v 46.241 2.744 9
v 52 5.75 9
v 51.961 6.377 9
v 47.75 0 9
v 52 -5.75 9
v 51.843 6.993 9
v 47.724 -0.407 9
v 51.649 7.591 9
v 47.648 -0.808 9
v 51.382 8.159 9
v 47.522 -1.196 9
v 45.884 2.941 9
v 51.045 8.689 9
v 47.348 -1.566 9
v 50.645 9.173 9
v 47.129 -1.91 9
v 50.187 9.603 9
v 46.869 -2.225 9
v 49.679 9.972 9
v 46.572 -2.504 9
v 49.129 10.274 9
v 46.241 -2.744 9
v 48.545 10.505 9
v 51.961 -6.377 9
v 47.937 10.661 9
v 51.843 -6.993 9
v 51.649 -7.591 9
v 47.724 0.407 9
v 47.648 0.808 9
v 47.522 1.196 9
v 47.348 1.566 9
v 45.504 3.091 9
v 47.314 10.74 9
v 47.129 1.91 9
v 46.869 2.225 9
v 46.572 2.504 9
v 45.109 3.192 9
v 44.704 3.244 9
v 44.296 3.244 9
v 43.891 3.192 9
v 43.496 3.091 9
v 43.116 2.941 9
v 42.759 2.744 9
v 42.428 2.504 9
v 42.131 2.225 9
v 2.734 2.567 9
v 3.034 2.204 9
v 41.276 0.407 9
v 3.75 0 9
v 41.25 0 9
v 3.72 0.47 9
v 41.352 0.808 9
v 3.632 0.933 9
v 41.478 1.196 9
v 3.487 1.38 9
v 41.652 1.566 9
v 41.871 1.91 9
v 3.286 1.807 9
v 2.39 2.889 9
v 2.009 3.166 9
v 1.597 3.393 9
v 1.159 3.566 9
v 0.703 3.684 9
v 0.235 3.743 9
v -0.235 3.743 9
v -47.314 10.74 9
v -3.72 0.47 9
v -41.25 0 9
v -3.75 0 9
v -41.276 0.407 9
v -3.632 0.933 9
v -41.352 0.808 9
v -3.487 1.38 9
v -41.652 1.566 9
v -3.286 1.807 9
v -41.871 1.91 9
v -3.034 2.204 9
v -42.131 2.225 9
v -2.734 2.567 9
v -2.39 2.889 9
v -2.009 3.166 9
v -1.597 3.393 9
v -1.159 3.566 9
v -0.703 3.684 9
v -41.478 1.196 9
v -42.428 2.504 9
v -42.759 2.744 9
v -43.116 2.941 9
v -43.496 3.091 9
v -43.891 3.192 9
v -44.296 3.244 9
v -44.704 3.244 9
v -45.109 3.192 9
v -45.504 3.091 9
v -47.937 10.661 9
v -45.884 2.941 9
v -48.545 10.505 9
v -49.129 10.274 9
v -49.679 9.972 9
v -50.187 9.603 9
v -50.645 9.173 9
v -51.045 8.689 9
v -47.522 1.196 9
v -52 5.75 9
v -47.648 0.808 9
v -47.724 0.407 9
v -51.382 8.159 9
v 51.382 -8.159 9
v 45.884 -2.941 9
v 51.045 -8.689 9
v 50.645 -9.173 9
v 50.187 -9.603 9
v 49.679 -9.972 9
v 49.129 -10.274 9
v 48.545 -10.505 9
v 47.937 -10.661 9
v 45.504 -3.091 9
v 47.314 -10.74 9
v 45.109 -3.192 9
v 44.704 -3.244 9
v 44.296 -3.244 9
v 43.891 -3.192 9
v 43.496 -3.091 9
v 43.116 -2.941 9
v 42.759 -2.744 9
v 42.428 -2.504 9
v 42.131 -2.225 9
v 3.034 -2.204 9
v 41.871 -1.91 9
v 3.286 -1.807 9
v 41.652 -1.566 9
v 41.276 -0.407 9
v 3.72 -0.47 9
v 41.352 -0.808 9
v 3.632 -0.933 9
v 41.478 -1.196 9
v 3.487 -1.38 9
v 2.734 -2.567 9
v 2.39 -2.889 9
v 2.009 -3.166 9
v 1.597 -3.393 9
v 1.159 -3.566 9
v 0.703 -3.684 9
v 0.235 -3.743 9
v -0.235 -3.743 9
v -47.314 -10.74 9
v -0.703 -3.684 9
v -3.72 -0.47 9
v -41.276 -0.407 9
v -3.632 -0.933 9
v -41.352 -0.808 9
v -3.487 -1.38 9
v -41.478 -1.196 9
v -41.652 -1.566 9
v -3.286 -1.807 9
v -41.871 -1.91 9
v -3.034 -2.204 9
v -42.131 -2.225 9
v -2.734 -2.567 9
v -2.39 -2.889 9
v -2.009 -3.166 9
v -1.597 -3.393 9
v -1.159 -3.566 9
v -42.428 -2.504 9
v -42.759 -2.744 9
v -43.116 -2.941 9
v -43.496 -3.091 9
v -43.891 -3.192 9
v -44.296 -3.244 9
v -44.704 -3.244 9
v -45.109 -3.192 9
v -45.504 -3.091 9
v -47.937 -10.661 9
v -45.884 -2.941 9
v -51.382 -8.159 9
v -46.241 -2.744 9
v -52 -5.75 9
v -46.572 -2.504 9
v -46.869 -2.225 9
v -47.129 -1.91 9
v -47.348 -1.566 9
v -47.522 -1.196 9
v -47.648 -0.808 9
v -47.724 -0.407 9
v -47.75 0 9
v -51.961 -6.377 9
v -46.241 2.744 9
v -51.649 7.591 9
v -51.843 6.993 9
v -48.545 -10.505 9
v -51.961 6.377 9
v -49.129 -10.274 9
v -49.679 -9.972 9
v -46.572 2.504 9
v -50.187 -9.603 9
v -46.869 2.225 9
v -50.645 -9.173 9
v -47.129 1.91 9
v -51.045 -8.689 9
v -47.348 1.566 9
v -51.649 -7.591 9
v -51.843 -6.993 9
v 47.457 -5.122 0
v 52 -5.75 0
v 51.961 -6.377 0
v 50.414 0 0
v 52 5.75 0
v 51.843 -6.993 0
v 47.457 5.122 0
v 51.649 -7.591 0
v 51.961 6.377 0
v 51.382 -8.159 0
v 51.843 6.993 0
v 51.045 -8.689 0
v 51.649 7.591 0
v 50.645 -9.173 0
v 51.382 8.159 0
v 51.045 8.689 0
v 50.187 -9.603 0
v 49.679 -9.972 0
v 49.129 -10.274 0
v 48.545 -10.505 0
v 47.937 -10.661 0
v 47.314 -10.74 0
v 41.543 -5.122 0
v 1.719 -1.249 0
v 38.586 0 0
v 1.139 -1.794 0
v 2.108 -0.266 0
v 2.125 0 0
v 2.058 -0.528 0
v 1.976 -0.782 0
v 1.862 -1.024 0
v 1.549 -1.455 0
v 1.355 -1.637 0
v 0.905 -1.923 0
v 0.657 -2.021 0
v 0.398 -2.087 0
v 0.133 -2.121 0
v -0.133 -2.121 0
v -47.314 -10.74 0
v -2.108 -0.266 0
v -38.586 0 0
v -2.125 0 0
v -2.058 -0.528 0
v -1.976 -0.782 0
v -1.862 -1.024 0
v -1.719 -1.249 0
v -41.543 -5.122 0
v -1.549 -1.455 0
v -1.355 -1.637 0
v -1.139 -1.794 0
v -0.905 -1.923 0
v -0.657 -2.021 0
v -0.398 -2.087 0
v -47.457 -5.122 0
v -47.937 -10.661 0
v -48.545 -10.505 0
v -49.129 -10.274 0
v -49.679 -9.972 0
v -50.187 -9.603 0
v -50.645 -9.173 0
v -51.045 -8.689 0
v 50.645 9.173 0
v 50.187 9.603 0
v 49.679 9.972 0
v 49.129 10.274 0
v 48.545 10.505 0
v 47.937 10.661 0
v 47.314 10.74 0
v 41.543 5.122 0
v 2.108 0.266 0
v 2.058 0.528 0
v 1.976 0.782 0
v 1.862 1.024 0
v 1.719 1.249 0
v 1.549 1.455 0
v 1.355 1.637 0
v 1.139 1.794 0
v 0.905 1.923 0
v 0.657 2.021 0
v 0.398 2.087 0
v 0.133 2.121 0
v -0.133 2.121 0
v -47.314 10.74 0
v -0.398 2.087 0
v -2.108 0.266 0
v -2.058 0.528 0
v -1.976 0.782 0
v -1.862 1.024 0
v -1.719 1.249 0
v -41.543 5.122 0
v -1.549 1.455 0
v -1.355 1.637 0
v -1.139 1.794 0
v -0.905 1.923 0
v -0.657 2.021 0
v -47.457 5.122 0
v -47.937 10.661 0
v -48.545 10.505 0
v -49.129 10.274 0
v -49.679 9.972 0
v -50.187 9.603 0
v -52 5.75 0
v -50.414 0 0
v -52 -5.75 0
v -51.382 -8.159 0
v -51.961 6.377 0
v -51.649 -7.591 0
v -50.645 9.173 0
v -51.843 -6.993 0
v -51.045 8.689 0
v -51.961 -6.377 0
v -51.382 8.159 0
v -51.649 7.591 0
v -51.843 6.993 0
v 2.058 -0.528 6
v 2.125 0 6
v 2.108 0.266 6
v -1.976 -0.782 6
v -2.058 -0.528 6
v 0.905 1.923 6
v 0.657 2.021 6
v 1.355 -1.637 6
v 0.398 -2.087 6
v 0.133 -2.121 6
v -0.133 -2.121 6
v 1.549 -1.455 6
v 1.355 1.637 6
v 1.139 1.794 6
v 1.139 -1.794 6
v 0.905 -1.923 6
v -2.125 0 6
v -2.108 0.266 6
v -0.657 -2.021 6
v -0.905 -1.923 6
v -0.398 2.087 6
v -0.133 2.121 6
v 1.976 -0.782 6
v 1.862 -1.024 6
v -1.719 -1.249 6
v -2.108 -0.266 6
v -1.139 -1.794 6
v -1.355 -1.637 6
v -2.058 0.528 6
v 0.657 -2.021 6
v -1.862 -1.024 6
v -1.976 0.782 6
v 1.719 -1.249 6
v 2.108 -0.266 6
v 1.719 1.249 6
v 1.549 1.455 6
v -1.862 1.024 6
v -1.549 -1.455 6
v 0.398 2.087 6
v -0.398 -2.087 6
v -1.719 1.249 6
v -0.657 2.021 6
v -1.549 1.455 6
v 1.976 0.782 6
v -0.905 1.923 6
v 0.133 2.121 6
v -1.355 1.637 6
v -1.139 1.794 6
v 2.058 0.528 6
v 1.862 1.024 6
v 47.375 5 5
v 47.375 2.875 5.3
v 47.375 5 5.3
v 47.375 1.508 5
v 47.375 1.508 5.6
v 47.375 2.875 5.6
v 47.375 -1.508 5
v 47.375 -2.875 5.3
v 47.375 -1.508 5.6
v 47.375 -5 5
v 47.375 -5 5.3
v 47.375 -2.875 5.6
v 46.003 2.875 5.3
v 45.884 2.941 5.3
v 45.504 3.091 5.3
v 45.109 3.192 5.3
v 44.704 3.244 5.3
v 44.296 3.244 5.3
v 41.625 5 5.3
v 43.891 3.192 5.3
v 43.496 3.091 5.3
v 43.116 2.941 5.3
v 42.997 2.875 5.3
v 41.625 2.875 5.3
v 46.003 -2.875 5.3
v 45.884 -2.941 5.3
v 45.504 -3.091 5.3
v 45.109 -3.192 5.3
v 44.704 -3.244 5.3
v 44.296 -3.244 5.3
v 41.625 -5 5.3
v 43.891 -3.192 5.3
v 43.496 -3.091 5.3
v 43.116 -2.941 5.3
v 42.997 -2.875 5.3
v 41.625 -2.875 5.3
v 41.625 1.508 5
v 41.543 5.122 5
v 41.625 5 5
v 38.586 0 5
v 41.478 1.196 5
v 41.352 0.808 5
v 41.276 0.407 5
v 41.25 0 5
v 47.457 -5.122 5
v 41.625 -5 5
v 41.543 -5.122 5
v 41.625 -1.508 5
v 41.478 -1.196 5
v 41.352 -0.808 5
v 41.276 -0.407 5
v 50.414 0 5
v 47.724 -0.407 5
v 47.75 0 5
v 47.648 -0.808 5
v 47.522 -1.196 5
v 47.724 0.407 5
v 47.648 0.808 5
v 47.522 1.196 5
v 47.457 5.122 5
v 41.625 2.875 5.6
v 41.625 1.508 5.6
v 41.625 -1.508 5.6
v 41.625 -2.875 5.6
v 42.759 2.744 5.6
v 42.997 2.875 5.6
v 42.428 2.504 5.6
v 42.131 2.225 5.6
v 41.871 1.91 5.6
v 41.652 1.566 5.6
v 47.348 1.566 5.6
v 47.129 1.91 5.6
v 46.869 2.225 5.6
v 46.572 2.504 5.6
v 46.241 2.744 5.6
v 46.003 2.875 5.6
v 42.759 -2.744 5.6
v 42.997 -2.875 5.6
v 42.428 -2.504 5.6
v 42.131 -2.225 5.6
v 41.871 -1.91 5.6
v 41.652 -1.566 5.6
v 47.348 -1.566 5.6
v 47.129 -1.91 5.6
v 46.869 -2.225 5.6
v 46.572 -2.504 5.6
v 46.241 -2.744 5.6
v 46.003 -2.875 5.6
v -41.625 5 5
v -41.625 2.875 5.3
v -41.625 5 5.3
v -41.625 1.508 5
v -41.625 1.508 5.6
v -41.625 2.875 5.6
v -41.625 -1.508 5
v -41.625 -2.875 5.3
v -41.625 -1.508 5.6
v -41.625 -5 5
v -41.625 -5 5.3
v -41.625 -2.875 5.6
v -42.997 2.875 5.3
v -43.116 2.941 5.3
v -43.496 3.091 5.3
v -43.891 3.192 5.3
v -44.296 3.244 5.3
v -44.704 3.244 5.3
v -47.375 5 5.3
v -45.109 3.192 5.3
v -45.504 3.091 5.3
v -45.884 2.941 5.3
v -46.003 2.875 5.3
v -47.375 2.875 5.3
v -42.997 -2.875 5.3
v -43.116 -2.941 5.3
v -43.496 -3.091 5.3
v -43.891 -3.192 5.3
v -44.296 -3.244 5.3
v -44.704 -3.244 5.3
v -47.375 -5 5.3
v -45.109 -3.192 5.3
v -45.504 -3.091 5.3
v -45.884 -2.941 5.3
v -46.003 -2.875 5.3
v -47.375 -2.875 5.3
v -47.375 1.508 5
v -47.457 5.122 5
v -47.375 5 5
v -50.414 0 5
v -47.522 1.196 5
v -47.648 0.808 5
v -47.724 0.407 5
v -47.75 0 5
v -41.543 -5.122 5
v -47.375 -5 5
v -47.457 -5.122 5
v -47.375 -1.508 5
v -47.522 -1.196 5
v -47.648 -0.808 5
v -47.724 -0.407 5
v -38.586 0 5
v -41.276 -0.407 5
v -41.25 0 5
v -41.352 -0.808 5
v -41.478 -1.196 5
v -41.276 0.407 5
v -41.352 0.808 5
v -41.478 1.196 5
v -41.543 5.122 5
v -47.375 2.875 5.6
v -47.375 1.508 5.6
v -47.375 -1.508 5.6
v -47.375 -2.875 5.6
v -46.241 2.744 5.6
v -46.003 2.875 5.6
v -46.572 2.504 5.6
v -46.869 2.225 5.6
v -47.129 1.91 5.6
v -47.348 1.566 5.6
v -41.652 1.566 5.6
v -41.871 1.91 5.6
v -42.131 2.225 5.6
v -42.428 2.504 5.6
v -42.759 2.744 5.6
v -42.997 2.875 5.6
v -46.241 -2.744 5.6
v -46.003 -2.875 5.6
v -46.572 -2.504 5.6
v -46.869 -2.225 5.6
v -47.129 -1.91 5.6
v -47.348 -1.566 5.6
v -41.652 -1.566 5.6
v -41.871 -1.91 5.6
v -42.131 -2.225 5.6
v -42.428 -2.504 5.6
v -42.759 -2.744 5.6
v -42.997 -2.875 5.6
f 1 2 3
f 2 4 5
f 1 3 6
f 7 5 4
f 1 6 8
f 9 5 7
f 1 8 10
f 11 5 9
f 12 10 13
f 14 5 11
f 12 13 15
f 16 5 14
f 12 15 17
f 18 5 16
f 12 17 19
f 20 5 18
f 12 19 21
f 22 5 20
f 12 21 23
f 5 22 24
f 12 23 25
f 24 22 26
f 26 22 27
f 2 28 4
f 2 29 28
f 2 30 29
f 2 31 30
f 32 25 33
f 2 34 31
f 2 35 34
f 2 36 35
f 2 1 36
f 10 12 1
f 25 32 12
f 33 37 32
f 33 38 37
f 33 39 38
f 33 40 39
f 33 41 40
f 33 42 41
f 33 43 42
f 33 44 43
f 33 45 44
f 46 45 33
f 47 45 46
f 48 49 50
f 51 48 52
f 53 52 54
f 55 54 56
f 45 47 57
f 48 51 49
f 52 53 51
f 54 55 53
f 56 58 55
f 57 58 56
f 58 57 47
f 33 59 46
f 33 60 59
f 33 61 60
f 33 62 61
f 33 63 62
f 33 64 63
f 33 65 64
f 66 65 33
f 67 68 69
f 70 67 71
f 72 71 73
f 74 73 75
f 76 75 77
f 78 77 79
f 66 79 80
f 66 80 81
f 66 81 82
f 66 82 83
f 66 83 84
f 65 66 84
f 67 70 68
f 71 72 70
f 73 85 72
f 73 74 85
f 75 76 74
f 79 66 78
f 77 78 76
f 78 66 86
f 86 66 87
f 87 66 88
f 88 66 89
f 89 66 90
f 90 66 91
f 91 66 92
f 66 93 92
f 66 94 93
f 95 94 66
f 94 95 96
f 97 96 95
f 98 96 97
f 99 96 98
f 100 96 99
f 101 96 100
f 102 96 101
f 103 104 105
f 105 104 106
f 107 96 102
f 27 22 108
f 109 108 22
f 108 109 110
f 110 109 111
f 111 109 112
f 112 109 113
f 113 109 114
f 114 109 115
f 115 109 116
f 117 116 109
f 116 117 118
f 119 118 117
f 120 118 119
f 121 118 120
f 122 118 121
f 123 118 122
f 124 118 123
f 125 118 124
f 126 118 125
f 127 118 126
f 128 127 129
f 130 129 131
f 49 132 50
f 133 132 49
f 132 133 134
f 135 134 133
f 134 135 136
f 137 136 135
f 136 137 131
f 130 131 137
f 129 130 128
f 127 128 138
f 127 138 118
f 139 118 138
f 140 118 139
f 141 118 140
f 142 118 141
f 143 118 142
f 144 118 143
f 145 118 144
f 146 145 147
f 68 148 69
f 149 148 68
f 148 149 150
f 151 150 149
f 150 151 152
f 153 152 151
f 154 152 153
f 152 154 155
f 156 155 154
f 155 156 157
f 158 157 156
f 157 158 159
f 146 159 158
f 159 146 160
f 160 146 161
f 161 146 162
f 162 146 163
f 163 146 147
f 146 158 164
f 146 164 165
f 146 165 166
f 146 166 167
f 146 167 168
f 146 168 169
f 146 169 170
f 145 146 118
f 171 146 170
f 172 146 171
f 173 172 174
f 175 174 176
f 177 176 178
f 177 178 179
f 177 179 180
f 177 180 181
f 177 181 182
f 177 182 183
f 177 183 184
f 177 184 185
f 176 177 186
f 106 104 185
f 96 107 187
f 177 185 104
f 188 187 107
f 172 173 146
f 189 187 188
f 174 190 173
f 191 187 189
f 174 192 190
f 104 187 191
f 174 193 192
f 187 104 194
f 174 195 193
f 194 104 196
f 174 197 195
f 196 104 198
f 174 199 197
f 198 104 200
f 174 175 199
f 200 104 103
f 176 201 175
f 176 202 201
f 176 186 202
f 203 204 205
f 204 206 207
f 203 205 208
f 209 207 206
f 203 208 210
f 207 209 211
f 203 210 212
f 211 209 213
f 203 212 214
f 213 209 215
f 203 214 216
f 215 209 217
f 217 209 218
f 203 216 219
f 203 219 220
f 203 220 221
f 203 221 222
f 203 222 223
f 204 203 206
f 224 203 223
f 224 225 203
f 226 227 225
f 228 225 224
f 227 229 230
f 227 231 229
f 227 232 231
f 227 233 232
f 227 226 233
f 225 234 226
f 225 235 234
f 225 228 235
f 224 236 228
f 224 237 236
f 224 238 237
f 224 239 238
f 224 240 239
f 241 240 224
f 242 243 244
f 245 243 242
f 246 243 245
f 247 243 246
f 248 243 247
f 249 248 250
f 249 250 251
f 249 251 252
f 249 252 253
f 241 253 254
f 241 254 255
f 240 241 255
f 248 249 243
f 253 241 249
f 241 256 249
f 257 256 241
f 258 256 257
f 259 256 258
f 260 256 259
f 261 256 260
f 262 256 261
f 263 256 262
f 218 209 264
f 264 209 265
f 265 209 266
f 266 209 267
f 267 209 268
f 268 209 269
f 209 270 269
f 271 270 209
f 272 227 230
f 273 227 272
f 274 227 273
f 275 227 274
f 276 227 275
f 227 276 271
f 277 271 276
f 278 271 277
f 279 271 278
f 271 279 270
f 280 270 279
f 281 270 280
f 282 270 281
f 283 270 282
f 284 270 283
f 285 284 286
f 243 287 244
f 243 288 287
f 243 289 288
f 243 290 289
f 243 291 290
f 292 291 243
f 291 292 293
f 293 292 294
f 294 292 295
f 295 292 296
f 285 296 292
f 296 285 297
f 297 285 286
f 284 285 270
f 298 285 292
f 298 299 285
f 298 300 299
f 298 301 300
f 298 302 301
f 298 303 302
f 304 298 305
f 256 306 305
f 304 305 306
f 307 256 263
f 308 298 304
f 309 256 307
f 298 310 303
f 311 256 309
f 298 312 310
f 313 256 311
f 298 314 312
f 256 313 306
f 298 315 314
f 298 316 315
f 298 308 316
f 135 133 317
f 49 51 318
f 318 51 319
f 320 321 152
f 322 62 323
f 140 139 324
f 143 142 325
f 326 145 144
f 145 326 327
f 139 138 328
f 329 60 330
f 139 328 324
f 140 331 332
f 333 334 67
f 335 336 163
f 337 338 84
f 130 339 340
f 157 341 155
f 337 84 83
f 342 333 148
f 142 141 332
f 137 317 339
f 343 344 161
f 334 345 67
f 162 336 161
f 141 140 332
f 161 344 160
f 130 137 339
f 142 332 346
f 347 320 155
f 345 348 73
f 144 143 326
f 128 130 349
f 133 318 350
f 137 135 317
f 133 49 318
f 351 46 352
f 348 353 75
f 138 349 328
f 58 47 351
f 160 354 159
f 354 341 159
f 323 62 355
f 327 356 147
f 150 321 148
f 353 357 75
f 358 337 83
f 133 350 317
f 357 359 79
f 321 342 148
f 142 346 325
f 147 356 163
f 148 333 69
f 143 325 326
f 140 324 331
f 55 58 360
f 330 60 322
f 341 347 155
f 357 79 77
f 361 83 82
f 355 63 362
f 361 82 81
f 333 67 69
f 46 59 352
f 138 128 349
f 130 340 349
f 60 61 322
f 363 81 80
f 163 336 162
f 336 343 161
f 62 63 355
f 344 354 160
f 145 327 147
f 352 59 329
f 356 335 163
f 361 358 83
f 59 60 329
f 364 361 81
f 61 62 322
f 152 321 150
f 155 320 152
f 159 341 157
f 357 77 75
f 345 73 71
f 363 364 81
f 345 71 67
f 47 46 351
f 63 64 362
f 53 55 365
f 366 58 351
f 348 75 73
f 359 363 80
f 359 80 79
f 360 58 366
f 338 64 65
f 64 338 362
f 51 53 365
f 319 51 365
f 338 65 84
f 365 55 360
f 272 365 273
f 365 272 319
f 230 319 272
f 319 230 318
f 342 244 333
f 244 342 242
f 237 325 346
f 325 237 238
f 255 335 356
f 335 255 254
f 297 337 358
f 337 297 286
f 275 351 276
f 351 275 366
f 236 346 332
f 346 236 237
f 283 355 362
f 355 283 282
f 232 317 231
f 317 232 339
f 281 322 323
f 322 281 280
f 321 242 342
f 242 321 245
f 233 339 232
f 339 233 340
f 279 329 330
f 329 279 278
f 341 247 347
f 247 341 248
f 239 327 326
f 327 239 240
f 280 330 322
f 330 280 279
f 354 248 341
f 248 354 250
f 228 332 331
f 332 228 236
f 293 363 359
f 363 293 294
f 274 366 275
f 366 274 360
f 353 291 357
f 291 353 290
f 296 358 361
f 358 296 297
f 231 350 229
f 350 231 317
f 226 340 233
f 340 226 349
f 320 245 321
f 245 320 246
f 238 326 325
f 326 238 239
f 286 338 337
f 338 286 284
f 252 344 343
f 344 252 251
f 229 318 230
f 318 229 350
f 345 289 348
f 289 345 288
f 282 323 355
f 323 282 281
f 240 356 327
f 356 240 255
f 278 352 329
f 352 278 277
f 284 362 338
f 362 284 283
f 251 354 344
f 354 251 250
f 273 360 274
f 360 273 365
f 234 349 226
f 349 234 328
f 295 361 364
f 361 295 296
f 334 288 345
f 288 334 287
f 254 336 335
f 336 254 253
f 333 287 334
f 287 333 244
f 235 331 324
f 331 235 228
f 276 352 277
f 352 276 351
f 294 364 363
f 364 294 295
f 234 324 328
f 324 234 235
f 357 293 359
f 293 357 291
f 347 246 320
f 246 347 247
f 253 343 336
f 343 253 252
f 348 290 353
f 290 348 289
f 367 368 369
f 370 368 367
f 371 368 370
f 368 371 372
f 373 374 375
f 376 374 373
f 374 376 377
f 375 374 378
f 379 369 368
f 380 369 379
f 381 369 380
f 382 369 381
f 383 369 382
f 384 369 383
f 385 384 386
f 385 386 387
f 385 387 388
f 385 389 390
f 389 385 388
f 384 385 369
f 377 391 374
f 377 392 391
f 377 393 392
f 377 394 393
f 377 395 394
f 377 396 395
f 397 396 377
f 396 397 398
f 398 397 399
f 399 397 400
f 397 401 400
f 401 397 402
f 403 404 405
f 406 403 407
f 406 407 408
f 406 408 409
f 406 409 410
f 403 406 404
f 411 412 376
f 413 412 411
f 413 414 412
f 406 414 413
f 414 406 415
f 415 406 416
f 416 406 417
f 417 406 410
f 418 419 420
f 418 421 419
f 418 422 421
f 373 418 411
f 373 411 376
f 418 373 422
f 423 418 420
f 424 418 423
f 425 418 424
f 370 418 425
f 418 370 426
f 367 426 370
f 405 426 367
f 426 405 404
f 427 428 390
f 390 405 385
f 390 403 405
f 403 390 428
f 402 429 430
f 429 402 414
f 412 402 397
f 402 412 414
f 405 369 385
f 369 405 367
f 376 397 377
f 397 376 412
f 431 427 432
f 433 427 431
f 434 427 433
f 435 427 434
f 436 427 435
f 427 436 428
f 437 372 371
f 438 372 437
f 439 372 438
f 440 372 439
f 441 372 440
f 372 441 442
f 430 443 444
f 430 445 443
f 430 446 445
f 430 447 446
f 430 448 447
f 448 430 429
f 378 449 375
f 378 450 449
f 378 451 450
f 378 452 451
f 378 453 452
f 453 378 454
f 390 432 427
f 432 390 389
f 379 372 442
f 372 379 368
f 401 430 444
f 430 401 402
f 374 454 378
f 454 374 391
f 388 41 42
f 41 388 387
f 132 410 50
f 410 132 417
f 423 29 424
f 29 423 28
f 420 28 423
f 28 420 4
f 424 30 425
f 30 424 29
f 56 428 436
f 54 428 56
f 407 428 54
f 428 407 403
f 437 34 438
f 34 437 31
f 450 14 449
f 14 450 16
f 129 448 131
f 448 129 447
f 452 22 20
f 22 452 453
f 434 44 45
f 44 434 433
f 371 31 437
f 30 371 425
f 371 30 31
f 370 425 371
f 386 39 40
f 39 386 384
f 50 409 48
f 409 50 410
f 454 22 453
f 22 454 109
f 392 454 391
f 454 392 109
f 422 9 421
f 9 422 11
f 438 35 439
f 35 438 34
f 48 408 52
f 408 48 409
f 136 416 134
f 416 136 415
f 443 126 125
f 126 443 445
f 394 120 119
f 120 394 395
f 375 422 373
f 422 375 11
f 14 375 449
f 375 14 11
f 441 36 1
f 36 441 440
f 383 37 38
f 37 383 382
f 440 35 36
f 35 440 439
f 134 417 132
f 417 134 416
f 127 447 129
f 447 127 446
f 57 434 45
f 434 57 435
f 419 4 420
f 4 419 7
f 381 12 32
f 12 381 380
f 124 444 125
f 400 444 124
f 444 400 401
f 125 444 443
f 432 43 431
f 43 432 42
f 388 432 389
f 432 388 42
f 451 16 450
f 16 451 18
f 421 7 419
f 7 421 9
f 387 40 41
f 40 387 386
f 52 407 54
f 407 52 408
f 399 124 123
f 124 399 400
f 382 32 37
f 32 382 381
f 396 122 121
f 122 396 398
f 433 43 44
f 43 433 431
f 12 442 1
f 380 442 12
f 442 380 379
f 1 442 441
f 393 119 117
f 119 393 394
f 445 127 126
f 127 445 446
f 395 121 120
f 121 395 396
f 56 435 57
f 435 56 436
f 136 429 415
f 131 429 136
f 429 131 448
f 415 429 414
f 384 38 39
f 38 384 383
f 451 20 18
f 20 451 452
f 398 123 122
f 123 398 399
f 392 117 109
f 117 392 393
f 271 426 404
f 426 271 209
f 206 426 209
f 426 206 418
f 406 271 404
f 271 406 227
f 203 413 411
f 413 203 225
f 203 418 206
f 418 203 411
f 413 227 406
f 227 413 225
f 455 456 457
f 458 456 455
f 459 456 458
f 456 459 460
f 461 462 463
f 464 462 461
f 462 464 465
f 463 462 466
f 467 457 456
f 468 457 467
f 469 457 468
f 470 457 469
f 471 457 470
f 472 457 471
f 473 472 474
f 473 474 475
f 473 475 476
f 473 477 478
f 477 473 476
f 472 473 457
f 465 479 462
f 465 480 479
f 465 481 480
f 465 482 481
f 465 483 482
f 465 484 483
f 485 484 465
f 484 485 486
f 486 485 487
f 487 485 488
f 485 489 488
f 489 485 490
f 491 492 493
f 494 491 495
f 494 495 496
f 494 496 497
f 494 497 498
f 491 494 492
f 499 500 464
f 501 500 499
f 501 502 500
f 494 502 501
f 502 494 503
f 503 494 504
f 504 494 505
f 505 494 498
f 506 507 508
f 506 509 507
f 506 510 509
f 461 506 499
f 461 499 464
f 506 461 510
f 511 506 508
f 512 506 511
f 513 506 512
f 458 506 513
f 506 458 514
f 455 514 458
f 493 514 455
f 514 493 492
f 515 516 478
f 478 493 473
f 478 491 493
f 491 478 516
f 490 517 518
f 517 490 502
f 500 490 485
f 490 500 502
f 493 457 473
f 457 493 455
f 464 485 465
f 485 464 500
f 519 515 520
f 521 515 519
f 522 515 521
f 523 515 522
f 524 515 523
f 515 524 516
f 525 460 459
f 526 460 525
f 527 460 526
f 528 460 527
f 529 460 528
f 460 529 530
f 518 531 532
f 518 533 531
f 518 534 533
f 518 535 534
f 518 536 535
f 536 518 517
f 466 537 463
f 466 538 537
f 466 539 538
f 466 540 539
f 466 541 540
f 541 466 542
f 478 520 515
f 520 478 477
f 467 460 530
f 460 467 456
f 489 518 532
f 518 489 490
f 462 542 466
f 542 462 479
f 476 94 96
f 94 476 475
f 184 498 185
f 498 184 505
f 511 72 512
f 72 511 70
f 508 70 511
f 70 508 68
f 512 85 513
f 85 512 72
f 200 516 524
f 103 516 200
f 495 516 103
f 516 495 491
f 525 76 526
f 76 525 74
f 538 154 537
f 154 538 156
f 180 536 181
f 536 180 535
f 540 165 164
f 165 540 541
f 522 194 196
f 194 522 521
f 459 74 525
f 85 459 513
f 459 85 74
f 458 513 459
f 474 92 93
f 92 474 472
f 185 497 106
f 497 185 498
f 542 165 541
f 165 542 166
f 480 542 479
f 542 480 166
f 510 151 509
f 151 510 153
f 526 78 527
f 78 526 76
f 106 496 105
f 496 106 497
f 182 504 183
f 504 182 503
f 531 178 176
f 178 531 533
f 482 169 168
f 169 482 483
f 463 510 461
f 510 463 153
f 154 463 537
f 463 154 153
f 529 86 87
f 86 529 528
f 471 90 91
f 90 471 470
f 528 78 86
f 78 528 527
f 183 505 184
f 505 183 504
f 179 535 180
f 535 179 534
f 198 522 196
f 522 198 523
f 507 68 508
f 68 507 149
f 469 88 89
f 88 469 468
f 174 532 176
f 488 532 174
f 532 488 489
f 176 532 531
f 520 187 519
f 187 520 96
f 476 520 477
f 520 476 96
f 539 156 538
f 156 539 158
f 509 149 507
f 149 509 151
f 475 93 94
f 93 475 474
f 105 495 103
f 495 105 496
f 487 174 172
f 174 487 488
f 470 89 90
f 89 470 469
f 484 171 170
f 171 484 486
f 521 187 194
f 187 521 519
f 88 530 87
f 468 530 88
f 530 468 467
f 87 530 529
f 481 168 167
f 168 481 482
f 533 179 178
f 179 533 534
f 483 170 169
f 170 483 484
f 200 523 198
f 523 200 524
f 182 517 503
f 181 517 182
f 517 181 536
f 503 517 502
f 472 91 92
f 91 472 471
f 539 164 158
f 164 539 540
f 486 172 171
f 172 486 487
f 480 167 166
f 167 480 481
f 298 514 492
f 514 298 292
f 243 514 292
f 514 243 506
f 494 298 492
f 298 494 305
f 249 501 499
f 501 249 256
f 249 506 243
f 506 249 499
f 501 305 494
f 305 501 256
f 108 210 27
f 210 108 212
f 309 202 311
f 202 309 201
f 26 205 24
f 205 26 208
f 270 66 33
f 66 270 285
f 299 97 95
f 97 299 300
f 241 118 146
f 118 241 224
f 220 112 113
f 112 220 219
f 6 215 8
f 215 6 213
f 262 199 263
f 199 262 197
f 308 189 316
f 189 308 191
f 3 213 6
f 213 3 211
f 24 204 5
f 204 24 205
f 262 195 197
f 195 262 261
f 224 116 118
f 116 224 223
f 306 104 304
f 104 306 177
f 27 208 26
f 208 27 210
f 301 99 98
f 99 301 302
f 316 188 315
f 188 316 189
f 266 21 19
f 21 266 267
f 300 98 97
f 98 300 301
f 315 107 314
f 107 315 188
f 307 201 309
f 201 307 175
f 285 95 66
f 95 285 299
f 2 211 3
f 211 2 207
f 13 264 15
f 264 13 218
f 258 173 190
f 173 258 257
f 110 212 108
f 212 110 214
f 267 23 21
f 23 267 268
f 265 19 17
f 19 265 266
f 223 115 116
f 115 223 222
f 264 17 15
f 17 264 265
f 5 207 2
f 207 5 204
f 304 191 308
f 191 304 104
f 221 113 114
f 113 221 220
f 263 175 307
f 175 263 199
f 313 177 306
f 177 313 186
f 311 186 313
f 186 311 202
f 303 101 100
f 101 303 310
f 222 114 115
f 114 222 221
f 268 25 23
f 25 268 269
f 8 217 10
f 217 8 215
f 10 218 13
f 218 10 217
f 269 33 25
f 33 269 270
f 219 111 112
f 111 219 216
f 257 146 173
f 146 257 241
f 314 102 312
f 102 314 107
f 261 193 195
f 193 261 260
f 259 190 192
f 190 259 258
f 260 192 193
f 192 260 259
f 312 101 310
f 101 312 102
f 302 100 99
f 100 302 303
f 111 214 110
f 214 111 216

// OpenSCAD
$fn = 50;


difference() {
	union() {
		hull() {
			translate(v = [-47.0000000000, 5.7500000000, 0]) {
				cylinder(h = 9, r = 5);
			}
			translate(v = [47.0000000000, 5.7500000000, 0]) {
				cylinder(h = 9, r = 5);
			}
			translate(v = [-47.0000000000, -5.7500000000, 0]) {
				cylinder(h = 9, r = 5);
			}
			translate(v = [47.0000000000, -5.7500000000, 0]) {
				cylinder(h = 9, r = 5);
			}
		}
	}
	union() {
		translate(v = [0, 0, 9]) {
			rotate(a = [0, 0, 0]) {
				difference() {
					union() {
						#translate(v = [0, 0, -9.0000000000]) {
							cylinder(h = 9, r = 2.0000000000);
						}
						#translate(v = [0, 0, -3]) {
							cylinder(h = 3, r1 = 2.1250000000, r2 = 3.7500000000);
						}
						#translate(v = [0, 0, -9.0000000000]) {
							cylinder(h = 9, r = 2.1250000000);
						}
						#translate(v = [0, 0, -9.0000000000]) {
							cylinder(h = 9, r = 2.0000000000);
						}
					}
					union();
				}
			}
		}
		translate(v = [44.5000000000, 0, 0]) {
			rotate(a = [0, 0, 0]) {
				difference() {
					union() {
						#translate(v = [-2.8750000000, -5.0000000000, -0.3000000000]) {
							cube(size = [5.7500000000, 10, 0.3000000000]);
						}
						#translate(v = [-2.8750000000, -2.8750000000, -0.6000000000]) {
							cube(size = [5.7500000000, 5.7500000000, 0.3000000000]);
						}
						#translate(v = [-2.8750000000, -5.0000000000, 5]) {
							cube(size = [5.7500000000, 10, 0.3000000000]);
						}
						#translate(v = [-2.8750000000, -2.8750000000, 5.3000000000]) {
							cube(size = [5.7500000000, 5.7500000000, 0.3000000000]);
						}
						#translate(v = [0, 0, -100.0000000000]) {
							cylinder(h = 200, r = 3.2500000000);
						}
						#linear_extrude(height = 5) {
							polygon(points = [[5.9142500000, 0.0000000000], [2.9571250000, 5.1218907443], [-2.9571250000, 5.1218907443], [-5.9142500000, 0.0000000000], [-2.9571250000, -5.1218907443], [2.9571250000, -5.1218907443]]);
						}
						#translate(v = [-2.8750000000, -5.0000000000, -0.3000000000]) {
							cube(size = [5.7500000000, 10, 0.3000000000]);
						}
						#translate(v = [-2.8750000000, -2.8750000000, -0.6000000000]) {
							cube(size = [5.7500000000, 5.7500000000, 0.3000000000]);
						}
						#translate(v = [-2.8750000000, -5.0000000000, 5]) {
							cube(size = [5.7500000000, 10, 0.3000000000]);
						}
						#translate(v = [-2.8750000000, -2.8750000000, 5.3000000000]) {
							cube(size = [5.7500000000, 5.7500000000, 0.3000000000]);
						}
						#translate(v = [0, 0, -100.0000000000]) {
							cylinder(h = 200, r = 3.2500000000);
						}
						#translate(v = [-2.8750000000, -5.0000000000, -0.3000000000]) {
							cube(size = [5.7500000000, 10, 0.3000000000]);
						}
						#translate(v = [-2.8750000000, -2.8750000000, -0.6000000000]) {
							cube(size = [5.7500000000, 5.7500000000, 0.3000000000]);
						}
						#translate(v = [-2.8750000000, -5.0000000000, 5]) {
							cube(size = [5.7500000000, 10, 0.3000000000]);
						}
						#translate(v = [-2.8750000000, -2.8750000000, 5.3000000000]) {
							cube(size = [5.7500000000, 5.7500000000, 0.3000000000]);
						}
						#translate(v = [0, 0, -100.0000000000]) {
							cylinder(h = 200, r = 3.2500000000);
						}
					}
					union();
				}
			}
		}
		translate(v = [-44.5000000000, 0, 0]) {
			rotate(a = [0, 0, 0]) {
				difference() {
					union() {
						#translate(v = [-2.8750000000, -5.0000000000, -0.3000000000]) {
							cube(size = [5.7500000000, 10, 0.3000000000]);
						}
						#translate(v = [-2.8750000000, -2.8750000000, -0.6000000000]) {
							cube(size = [5.7500000000, 5.7500000000, 0.3000000000]);
						}
						#translate(v = [-2.8750000000, -5.0000000000, 5]) {
							cube(size = [5.7500000000, 10, 0.3000000000]);
						}
						#translate(v = [-2.8750000000, -2.8750000000, 5.3000000000]) {
							cube(size = [5.7500000000, 5.7500000000, 0.3000000000]);
						}
						#translate(v = [0, 0, -100.0000000000]) {
							cylinder(h = 200, r = 3.2500000000);
						}
						#linear_extrude(height = 5) {
							polygon(points = [[5.9142500000, 0.0000000000], [2.9571250000, 5.1218907443], [-2.9571250000, 5.1218907443], [-5.9142500000, 0.0000000000], [-2.9571250000, -5.1218907443], [2.9571250000, -5.1218907443]]);
						}
						#translate(v = [-2.8750000000, -5.0000000000, -0.3000000000]) {
							cube(size = [5.7500000000, 10, 0.3000000000]);
						}
						#translate(v = [-2.8750000000, -2.8750000000, -0.6000000000]) {
							cube(size = [5.7500000000, 5.7500000000, 0.3000000000]);
						}
						#translate(v = [-2.8750000000, -5.0000000000, 5]) {
							cube(size = [5.7500000000, 10, 0.3000000000]);
						}
						#translate(v = [-2.8750000000, -2.8750000000, 5.3000000000]) {
							cube(size = [5.7500000000, 5.7500000000, 0.3000000000]);
						}
						#translate(v = [0, 0, -100.0000000000]) {
							cylinder(h = 200, r = 3.2500000000);
						}
						#translate(v = [-2.8750000000, -5.0000000000, -0.3000000000]) {
							cube(size = [5.7500000000, 10, 0.3000000000]);
						}
						#translate(v = [-2.8750000000, -2.8750000000, -0.6000000000]) {
							cube(size = [5.7500000000, 5.7500000000, 0.3000000000]);
						}
						#translate(v = [-2.8750000000, -5.0000000000, 5]) {
							cube(size = [5.7500000000, 10, 0.3000000000]);
						}
						#translate(v = [-2.8750000000, -2.8750000000, 5.3000000000]) {
							cube(size = [5.7500000000, 5.7500000000, 0.3000000000]);
						}
						#translate(v = [0, 0, -100.0000000000]) {
							cylinder(h = 200, r = 3.2500000000);
						}
					}
					union();
				}
			}
		}
	}
}
